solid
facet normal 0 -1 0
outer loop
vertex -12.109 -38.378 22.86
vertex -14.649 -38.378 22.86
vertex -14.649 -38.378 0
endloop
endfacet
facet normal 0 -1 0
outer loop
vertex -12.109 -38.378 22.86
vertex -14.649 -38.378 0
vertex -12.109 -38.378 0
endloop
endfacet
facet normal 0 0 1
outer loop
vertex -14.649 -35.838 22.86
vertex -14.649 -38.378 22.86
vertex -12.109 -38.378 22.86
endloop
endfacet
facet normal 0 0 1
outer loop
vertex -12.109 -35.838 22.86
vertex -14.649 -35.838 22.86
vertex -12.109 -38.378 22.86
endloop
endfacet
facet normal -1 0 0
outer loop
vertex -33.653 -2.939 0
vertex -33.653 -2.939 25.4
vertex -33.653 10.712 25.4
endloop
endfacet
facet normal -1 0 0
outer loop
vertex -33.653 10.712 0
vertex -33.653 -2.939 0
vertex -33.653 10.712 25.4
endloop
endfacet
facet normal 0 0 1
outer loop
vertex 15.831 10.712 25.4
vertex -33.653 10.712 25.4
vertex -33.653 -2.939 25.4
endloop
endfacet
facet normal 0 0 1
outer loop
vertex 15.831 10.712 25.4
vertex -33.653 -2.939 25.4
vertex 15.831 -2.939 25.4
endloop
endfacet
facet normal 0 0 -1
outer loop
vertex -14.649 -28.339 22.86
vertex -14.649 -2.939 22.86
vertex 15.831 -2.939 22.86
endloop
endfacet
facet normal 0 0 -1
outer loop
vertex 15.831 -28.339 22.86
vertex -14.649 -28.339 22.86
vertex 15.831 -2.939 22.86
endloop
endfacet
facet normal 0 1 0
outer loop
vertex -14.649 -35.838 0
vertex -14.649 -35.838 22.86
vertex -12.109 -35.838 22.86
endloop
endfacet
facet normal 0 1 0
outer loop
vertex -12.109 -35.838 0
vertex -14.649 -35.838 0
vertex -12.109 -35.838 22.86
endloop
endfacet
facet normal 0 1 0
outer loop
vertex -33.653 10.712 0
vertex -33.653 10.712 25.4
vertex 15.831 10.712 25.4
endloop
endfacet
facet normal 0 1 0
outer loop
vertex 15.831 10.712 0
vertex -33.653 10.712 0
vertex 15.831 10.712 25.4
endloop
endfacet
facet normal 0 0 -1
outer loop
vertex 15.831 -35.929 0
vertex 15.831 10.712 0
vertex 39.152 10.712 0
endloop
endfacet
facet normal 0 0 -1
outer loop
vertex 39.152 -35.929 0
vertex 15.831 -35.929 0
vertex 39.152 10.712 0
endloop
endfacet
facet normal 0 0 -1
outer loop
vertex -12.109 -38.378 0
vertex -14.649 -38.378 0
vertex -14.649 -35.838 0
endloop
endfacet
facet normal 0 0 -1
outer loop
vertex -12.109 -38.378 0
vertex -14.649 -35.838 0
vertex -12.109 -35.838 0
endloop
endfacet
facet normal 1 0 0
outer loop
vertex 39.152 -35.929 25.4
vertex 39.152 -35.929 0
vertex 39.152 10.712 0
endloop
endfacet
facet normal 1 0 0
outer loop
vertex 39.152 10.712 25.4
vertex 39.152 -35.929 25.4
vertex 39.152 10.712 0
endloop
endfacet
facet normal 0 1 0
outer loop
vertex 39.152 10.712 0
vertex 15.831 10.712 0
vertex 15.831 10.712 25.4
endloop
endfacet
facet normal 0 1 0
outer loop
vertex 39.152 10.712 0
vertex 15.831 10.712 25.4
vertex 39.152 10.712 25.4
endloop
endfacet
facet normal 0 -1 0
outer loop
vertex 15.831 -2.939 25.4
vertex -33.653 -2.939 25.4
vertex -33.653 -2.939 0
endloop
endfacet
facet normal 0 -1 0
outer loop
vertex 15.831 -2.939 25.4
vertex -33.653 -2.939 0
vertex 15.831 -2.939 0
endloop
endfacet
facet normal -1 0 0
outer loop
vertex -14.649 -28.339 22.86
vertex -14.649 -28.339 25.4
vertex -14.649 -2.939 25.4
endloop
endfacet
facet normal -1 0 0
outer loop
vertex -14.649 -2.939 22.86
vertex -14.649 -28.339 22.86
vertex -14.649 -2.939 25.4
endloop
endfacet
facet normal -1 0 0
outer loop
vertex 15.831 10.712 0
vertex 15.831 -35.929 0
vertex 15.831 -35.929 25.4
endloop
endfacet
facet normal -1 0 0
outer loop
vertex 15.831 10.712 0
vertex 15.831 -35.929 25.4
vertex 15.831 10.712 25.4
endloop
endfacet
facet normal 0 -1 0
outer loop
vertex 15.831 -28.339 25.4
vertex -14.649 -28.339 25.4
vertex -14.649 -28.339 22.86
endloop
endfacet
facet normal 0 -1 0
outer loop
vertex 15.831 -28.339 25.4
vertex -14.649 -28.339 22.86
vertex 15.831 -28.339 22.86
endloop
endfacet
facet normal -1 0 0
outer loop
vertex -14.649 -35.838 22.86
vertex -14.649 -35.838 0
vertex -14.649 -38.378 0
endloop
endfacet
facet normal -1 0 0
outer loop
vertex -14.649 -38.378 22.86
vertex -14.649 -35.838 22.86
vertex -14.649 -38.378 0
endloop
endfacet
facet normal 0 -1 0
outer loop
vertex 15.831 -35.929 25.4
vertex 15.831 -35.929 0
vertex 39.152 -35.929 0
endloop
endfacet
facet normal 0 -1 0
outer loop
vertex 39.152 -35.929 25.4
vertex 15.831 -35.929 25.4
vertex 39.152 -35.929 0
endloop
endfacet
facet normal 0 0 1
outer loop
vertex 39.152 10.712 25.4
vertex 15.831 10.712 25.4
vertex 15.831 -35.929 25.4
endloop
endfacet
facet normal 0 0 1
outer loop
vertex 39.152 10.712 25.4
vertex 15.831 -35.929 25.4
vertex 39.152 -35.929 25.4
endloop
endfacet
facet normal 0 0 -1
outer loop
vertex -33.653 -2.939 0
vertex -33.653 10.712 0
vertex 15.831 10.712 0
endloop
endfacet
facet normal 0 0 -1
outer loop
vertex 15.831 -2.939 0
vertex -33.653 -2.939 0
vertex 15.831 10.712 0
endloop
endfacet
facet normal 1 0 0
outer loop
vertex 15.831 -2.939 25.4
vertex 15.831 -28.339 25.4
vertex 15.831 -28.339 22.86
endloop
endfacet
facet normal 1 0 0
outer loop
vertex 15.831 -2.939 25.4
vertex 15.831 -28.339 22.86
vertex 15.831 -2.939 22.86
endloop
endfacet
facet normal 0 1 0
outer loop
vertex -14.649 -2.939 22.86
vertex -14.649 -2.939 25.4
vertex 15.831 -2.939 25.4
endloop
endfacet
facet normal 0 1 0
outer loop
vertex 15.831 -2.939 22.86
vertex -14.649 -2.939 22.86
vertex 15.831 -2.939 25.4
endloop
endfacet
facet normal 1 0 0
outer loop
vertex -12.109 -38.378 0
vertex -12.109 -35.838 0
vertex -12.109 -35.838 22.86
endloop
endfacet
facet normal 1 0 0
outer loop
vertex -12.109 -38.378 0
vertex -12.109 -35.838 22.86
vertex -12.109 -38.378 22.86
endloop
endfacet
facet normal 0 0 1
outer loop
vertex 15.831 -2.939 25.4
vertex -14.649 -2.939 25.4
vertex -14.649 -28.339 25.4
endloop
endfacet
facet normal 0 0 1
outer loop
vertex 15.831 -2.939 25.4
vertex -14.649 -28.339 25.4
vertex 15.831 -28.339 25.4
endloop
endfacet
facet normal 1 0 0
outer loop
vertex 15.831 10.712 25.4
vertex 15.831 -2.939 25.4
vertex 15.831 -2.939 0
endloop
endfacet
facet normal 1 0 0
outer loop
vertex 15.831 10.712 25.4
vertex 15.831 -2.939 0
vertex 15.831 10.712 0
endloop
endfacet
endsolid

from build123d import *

# Parameters (mm, degrees)
F0_W     = 23.3204513788
F0_H     = 46.6408990324
F1_DEPTH = 25.4
F2_W     = 49.4848564267
F2_H     = 13.650995912
F3_DEPTH = 25.4
F4_W     = 30.48
F4_H     = 25.4
F5_DEPTH = 2.54
F7_W     = 2.54
F7_H     = 2.54
F8_DEPTH = 22.86


with BuildPart() as f1:
    # F0 (on Top) → F1 (new body)
    with BuildSketch(Plane.XY):
        with Locations((27.4915881455, -12.6082096249)):
            Rectangle(F0_W, F0_H)
    extrude(amount=F1_DEPTH)


with BuildPart() as f3:
    # F2 (on face) → F3 (new body)
    with BuildSketch(Plane.XY.offset(25.4)):
        with Locations((-8.9110657573, 3.8867419353)):
            Rectangle(F2_W, F2_H)
    extrude(amount=-F3_DEPTH)


with BuildPart() as f5:
    # F4 (on face) → F5 (new body)
    with BuildSketch(Plane.XY.offset(25.4)):
        with Locations((0.5913624561, -15.6387560207)):
            Rectangle(F4_W, F4_H)
    extrude(amount=-F5_DEPTH)


with BuildPart() as f8:
    # F7 (on offset) → F8 (new body)
    with BuildSketch(Plane(origin=(0, 0, 0), x_dir=(1, 0, 0), z_dir=(0, 0, -1))):
        with Locations((-13.3786375439, 37.1075829383)):
            Rectangle(F7_W, F7_H)
    extrude(amount=-F8_DEPTH)


solid = Compound([f1.part, f3.part, f5.part, f8.part])
